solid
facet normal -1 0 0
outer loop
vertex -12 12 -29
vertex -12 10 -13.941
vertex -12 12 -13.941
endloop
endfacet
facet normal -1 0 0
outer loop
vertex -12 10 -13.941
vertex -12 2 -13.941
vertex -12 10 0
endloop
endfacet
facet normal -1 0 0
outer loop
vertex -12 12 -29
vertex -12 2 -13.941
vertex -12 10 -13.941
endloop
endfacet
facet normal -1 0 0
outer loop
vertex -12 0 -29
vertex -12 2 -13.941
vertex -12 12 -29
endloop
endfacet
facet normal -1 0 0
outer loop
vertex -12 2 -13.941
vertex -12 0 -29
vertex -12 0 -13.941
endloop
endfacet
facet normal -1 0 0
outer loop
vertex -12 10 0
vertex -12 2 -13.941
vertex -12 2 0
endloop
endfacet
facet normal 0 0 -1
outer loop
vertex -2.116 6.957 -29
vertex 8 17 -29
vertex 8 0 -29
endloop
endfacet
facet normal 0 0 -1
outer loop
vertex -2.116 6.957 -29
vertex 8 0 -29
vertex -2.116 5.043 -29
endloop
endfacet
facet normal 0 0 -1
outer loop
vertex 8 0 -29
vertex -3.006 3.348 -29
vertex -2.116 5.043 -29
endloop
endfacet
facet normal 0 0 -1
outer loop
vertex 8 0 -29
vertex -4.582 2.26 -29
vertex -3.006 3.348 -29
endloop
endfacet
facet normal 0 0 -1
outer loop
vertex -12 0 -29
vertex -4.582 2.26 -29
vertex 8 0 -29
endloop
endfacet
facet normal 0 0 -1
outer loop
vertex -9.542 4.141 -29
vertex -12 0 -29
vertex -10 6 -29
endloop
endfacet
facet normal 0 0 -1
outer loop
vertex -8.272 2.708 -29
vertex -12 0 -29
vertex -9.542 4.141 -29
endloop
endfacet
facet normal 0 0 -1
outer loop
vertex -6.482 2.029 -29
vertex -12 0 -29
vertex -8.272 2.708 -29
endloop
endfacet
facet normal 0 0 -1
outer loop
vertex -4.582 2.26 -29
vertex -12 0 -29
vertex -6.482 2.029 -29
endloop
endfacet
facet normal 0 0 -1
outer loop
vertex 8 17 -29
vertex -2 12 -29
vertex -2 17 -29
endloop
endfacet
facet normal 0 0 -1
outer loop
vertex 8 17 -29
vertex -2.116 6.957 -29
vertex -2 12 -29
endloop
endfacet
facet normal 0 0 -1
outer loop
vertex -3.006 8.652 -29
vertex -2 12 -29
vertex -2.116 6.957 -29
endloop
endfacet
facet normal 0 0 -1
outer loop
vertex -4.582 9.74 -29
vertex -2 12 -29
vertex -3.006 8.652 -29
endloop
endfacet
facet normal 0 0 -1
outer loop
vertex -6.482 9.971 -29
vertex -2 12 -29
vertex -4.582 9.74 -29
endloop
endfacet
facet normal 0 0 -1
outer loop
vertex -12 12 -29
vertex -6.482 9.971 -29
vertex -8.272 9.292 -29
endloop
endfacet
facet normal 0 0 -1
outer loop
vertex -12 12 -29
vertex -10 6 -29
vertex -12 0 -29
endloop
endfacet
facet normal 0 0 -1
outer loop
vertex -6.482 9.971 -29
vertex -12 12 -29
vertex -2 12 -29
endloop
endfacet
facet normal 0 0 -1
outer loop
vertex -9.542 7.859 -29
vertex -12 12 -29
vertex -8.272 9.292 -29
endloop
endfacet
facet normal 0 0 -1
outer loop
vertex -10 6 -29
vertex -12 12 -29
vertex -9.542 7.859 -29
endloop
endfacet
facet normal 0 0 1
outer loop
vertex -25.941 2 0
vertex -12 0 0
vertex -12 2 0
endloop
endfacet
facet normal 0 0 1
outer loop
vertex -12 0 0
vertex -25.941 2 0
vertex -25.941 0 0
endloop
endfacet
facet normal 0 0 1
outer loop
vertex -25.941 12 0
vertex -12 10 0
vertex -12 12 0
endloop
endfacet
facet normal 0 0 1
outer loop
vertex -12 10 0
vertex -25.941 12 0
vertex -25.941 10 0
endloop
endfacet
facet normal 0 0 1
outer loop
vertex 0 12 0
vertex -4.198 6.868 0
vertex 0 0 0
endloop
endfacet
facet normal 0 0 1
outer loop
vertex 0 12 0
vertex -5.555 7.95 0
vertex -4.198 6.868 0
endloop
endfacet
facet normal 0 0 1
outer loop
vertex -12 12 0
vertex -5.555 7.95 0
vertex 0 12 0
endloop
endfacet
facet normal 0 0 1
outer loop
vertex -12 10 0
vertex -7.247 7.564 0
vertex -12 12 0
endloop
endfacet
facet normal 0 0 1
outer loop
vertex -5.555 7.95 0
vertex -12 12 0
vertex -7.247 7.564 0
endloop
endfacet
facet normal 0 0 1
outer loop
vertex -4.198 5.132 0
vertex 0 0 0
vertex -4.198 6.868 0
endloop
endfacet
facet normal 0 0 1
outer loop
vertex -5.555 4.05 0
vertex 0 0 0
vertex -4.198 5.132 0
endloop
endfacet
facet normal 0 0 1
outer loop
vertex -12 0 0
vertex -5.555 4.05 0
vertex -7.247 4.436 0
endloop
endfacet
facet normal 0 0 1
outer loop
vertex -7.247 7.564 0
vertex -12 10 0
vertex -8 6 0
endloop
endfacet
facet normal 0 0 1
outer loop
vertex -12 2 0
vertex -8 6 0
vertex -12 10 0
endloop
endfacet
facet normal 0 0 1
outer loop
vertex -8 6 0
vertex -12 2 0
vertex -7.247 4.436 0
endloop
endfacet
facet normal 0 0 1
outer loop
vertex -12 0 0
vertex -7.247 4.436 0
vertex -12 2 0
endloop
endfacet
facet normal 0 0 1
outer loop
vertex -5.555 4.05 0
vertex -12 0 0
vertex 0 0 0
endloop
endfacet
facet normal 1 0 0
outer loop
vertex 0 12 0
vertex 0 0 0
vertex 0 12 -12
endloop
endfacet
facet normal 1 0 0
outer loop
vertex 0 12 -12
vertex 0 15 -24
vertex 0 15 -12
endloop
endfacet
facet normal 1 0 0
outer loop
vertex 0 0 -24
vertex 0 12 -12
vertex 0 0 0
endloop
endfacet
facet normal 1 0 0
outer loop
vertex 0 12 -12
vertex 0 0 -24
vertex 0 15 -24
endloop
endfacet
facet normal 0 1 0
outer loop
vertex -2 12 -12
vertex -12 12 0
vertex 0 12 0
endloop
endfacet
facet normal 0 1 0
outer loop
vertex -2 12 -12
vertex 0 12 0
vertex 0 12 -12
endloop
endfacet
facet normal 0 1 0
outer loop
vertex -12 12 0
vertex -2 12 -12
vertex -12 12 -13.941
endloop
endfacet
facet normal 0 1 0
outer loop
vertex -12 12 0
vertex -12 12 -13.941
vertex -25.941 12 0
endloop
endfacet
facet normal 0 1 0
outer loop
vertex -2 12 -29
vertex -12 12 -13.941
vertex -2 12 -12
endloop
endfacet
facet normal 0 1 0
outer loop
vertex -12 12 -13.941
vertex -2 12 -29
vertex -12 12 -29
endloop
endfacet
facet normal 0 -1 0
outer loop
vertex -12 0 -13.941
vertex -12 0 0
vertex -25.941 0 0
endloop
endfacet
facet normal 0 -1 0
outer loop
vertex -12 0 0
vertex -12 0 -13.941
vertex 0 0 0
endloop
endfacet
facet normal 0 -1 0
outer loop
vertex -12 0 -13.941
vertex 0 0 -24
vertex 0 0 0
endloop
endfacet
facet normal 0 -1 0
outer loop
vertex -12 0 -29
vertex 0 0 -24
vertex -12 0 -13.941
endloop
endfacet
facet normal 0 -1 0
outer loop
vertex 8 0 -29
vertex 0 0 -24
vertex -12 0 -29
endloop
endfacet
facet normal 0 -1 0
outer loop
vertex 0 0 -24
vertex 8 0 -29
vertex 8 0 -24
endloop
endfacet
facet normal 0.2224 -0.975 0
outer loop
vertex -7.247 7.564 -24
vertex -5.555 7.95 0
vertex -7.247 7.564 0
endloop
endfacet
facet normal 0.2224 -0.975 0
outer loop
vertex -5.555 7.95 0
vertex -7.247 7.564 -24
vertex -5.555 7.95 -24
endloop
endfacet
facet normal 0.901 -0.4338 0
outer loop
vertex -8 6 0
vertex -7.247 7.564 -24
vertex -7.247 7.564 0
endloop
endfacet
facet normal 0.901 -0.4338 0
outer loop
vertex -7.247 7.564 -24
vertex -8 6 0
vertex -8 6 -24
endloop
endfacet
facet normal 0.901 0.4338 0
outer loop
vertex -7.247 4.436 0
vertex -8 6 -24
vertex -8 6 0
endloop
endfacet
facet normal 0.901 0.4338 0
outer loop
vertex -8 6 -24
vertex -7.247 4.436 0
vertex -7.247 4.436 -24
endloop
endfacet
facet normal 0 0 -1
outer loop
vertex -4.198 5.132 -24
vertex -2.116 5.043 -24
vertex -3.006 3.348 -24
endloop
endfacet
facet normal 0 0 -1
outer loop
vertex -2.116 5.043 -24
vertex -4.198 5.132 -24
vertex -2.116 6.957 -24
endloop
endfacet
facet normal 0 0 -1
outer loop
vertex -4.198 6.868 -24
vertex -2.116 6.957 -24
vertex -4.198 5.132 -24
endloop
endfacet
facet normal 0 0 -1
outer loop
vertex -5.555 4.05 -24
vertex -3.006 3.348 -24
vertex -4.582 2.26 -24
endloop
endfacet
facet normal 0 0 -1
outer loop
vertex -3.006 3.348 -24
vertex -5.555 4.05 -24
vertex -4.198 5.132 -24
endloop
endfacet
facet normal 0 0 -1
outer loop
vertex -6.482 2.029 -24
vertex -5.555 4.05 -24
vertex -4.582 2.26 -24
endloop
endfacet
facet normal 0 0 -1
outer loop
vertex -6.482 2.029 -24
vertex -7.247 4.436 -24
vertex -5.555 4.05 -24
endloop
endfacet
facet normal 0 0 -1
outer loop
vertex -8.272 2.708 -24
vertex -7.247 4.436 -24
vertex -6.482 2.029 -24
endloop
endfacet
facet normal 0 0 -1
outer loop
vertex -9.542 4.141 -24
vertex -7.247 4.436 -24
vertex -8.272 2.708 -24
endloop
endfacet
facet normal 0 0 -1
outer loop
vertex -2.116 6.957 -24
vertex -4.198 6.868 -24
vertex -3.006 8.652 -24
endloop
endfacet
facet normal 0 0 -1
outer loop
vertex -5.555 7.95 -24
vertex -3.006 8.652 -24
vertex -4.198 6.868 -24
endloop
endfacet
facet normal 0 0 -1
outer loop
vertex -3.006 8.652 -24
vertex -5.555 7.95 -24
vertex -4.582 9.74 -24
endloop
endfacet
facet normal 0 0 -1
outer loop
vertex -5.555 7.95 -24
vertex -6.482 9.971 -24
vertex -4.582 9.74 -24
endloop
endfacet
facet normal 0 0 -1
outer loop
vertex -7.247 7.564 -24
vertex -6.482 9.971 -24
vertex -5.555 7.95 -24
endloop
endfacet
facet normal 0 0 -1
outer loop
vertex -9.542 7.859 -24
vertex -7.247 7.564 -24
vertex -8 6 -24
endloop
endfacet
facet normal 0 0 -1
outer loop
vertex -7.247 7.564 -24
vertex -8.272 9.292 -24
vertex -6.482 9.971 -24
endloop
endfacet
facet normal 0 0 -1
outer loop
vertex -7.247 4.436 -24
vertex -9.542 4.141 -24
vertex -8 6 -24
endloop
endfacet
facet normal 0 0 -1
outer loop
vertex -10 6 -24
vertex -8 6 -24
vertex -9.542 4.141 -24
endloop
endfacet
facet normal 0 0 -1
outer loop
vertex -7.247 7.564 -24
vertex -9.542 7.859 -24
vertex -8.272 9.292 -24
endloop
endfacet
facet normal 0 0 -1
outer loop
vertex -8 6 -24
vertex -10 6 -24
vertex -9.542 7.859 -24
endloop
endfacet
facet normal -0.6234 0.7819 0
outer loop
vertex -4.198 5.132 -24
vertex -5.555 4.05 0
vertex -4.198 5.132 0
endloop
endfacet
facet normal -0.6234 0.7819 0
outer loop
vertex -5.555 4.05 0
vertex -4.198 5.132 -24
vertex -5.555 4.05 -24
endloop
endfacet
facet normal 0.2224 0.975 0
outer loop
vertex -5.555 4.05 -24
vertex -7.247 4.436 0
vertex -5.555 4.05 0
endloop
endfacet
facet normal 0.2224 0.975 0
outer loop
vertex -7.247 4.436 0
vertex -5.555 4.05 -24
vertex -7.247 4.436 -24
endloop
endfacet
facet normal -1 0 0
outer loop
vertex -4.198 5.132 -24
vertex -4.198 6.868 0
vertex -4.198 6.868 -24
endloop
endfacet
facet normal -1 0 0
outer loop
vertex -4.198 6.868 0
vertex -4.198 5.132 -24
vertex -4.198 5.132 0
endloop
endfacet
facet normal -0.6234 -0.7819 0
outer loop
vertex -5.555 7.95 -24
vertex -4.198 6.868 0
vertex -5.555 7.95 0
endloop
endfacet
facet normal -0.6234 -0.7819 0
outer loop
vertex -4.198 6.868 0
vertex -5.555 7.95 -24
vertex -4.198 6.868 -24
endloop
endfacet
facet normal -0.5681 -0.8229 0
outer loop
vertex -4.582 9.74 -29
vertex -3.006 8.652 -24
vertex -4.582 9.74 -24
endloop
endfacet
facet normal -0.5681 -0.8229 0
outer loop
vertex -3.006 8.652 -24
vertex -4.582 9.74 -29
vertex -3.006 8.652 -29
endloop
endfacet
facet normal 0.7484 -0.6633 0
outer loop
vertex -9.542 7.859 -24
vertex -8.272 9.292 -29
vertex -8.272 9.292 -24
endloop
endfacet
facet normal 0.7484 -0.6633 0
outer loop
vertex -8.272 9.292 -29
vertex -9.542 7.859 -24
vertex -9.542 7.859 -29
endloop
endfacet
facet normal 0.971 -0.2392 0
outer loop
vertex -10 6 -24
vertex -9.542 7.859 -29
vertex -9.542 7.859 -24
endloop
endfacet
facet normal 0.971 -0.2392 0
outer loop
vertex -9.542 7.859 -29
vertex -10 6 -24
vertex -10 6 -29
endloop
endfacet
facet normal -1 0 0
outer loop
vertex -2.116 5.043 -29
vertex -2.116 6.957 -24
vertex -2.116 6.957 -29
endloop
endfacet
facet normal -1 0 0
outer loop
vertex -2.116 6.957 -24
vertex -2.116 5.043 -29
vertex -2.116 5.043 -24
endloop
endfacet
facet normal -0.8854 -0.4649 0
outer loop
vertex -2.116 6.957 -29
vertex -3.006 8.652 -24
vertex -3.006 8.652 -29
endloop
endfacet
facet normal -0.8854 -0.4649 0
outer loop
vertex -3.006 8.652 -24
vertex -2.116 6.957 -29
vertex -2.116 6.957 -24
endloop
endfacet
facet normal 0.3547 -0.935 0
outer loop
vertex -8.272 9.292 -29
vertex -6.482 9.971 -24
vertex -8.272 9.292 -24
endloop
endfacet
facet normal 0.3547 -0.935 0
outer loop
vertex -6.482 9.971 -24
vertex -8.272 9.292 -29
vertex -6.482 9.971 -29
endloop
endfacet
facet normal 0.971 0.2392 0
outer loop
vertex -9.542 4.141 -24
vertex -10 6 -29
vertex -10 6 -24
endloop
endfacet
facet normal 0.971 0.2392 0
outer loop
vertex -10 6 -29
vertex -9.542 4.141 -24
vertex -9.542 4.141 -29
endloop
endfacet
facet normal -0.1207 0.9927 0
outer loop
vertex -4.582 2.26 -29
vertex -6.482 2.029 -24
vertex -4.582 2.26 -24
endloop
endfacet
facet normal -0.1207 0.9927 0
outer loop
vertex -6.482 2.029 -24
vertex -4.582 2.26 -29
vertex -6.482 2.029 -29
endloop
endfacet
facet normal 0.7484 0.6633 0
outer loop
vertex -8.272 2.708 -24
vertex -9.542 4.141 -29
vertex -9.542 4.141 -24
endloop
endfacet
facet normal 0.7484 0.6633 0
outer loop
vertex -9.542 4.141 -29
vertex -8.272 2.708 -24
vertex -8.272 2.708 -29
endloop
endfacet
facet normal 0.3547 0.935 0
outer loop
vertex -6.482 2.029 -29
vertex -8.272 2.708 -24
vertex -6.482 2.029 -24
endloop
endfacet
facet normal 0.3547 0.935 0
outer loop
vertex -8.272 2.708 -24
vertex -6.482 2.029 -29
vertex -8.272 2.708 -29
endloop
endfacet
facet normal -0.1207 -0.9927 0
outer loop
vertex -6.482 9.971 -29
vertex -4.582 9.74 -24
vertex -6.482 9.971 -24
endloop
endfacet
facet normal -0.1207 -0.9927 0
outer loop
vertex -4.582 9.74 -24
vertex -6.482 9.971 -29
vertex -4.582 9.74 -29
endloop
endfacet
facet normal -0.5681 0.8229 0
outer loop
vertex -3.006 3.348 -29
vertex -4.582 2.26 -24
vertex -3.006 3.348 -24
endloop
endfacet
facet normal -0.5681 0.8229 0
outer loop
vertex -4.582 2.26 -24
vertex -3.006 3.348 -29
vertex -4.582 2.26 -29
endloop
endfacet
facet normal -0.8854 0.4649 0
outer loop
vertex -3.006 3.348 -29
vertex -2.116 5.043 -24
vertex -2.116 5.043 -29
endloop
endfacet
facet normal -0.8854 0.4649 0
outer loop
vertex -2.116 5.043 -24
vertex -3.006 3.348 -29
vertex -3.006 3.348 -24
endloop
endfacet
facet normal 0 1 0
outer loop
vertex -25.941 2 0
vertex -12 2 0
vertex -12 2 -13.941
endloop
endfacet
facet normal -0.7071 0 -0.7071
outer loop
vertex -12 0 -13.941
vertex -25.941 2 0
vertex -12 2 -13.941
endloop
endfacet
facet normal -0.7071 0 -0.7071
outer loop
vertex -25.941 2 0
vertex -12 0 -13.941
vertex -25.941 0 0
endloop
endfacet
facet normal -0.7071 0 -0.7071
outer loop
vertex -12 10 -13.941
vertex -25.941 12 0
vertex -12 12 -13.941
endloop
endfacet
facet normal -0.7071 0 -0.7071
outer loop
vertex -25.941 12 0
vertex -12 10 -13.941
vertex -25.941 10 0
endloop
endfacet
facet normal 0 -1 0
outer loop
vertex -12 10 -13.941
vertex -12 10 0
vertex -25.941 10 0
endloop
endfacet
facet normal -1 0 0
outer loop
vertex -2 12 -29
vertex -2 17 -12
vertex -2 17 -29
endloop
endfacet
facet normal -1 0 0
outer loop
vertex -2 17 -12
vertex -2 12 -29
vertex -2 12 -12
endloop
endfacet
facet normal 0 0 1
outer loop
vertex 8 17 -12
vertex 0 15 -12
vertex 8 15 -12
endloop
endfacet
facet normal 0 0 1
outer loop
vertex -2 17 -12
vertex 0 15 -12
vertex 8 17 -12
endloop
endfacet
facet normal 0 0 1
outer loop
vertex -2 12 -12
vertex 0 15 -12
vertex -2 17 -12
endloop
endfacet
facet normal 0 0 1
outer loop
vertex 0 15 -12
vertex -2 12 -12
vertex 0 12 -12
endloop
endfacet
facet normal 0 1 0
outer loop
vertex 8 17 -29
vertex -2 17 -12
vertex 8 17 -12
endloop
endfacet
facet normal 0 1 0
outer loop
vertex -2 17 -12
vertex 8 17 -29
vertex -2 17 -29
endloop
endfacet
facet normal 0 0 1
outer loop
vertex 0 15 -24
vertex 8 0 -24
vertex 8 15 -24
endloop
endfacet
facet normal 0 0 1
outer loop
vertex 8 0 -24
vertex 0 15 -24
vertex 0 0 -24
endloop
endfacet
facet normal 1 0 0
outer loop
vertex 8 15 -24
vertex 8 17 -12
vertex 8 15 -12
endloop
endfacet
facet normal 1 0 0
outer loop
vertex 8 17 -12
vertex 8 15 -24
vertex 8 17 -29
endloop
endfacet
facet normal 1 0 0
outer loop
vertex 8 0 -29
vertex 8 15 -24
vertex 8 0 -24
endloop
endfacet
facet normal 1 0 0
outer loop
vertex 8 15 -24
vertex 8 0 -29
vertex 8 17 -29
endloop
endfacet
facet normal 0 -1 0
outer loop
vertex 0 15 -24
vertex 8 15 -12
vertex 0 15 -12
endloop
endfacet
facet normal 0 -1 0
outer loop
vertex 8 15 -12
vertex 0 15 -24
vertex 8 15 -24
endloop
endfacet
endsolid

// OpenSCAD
dist=24;
head=5;
m=4;
ext=8;
wall=2;
hook=8;
side=3;

outer=ext+2*wall;

rotate([0,180,0]) {

translate([0,outer,dist-outer])
  cube([wall,side+wall,outer+head]);
translate([-hook,outer,dist])
  cube([hook,side,head]);
translate([-hook,outer+side,dist-outer])
  cube([hook,wall,outer+head]);
  
difference() {
  cube([outer, outer, dist+head]);
  translate([outer/2,outer/2,0])
    cylinder(r=m/2, h=dist);
  translate([outer/2,outer/2,dist])
    cylinder(r=ext/2, h=dist);
}
translate([-hook,0,dist])
cube([hook,outer,head]);
difference(){
  union(){
  translate([-outer+ext/2,0,0])
    rotate([0,45,0])
      cube([dist,wall,dist]);
  translate([-outer+ext/2,ext+wall,0])
    rotate([0,45,0])
      cube([dist,wall,dist]);
  }
  translate([-dist,0,-dist])
    cube([dist,dist,2*dist]);
  translate([-dist,0,-dist])
    cube([3*dist,dist,dist]);
}
//*/
}
